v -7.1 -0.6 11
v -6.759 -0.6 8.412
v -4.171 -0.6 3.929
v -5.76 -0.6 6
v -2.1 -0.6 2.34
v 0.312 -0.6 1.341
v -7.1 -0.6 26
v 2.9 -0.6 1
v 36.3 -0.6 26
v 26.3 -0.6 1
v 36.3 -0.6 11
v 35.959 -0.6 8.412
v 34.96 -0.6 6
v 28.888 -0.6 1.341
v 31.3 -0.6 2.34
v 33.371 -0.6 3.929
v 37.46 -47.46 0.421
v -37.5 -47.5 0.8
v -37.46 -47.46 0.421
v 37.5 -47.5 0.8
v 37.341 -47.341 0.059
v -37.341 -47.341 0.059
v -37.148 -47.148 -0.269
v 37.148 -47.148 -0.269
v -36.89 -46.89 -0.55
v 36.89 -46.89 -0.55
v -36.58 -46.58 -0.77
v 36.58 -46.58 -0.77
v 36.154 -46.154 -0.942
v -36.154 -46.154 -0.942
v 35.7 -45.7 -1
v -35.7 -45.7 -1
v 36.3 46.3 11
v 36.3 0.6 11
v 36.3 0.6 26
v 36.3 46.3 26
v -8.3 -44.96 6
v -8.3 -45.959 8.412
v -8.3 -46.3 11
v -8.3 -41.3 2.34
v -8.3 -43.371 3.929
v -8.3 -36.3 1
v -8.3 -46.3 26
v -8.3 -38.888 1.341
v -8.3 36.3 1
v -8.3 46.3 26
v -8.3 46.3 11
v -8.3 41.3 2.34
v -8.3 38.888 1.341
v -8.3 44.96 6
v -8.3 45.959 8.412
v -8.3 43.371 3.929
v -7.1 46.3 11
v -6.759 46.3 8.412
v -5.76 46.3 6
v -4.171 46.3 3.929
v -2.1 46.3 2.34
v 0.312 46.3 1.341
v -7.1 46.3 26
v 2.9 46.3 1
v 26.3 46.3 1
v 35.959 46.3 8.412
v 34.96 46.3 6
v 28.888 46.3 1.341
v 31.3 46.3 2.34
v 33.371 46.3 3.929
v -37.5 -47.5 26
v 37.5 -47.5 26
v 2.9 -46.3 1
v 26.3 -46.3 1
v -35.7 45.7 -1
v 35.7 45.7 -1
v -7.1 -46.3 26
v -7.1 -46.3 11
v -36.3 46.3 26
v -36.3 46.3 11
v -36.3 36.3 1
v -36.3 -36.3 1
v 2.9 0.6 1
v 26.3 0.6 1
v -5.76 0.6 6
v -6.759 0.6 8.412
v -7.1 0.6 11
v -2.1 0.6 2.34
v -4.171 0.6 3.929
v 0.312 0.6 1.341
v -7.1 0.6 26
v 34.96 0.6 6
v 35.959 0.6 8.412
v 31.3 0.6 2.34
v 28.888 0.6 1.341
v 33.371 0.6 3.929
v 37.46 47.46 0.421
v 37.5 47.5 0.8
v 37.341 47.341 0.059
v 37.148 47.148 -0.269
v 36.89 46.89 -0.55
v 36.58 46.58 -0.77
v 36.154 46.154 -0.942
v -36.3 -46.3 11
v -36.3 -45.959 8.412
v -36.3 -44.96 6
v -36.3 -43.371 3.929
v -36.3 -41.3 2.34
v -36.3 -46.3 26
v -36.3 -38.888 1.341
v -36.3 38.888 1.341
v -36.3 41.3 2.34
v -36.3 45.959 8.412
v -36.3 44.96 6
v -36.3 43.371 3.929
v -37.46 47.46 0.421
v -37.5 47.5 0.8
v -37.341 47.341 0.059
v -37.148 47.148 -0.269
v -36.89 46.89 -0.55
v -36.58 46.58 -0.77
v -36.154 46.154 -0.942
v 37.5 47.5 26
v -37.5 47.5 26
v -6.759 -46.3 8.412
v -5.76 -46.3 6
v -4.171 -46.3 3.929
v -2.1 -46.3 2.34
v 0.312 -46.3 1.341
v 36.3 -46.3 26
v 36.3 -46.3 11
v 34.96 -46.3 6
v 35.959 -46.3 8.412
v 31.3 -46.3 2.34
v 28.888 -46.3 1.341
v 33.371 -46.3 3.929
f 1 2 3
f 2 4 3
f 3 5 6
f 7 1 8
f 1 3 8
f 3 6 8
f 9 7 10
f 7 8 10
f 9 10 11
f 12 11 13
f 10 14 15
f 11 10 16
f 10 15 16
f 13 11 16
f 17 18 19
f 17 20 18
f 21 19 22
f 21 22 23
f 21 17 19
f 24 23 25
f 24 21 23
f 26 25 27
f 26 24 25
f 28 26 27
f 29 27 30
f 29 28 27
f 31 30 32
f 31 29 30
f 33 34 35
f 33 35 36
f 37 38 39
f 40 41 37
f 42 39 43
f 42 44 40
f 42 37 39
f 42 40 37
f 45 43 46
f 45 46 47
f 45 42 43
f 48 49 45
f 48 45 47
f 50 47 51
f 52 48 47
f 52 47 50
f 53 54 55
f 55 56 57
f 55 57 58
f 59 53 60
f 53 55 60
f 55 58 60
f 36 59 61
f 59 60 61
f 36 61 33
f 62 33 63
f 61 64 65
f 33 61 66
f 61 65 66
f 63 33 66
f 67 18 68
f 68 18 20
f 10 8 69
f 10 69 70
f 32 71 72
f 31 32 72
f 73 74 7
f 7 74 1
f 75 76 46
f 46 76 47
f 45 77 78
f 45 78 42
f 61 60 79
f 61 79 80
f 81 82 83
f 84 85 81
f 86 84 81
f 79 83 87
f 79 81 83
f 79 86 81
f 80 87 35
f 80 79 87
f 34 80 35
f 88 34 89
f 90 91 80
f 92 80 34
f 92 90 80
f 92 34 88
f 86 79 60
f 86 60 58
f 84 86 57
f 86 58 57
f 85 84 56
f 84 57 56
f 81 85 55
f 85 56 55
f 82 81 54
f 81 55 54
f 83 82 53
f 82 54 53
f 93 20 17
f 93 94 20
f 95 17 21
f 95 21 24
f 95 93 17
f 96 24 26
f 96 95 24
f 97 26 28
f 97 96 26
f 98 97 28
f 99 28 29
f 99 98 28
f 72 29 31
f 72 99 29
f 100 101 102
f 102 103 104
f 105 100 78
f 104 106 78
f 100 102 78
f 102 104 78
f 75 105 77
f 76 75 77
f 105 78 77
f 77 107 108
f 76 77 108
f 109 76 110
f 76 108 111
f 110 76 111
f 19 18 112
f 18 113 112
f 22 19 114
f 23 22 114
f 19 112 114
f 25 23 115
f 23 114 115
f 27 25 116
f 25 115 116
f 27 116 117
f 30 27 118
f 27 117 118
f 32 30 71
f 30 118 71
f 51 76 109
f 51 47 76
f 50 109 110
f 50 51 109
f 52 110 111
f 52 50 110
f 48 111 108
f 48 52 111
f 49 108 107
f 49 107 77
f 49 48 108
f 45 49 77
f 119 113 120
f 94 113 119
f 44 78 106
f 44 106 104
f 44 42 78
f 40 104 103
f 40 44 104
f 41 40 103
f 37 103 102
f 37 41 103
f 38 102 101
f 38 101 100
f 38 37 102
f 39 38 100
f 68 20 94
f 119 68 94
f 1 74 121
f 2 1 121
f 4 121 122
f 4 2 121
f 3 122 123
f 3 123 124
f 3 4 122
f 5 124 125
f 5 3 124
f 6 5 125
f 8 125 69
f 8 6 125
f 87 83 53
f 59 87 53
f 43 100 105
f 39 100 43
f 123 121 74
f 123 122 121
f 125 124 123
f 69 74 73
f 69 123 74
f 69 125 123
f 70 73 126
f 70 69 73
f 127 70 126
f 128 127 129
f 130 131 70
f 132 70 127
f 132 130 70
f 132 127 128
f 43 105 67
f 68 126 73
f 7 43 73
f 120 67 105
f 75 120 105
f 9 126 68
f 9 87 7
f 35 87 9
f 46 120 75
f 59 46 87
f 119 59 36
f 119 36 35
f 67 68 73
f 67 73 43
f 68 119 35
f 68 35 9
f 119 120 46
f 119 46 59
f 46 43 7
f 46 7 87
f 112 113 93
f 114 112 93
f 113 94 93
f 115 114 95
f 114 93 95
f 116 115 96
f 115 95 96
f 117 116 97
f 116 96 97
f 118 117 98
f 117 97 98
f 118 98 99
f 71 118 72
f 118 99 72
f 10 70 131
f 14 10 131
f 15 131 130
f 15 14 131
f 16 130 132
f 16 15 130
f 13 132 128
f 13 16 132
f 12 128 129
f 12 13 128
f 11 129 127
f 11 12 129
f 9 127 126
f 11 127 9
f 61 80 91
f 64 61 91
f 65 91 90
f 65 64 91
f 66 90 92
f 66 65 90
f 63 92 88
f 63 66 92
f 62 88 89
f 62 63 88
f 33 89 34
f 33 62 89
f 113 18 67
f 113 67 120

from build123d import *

# Parameters (mm, degrees)
SKETCH011_W             = 75
SKETCH011_H             = 95
PAD007_DEPTH            = 1
SKETCH012_W             = 75
SKETCH012_H             = 95
SKETCH012_W_2           = 28
SKETCH012_H_2           = 92.6
SKETCH012_W_3           = 43.4
SKETCH012_H_3           = 45.7
PAD008_DEPTH            = 25
FILLET010_R             = 10
FILLET011_R             = 1.8
BODY003_PLACEMENT_ANGLE = 90


with BuildPart() as part:
    # Sketch011 → Pad007 (new body, symmetric)
    with BuildSketch(Plane.XZ):
        Rectangle(SKETCH011_W, SKETCH011_H)
    extrude(amount=PAD007_DEPTH, both=True)

    # Sketch012 → Pad008 (join)
    with BuildSketch(Plane.XZ.offset(1)):
        Rectangle(SKETCH012_W, SKETCH012_H)
        with Locations((-22.3, 0)):
            Rectangle(SKETCH012_W_2, SKETCH012_H_2, mode=Mode.SUBTRACT)
        with Locations((14.6, 23.45)):
            Rectangle(SKETCH012_W_3, SKETCH012_H_3, mode=Mode.SUBTRACT)
        with Locations((14.6, -23.45)):
            Rectangle(SKETCH012_W_3, SKETCH012_H_3, mode=Mode.SUBTRACT)
    extrude(amount=PAD008_DEPTH)

    # Fillet010
    fillet010_edges = [part.edges().sort_by_distance(p)[0] for p in [
        (36.3, -1, 23.45),
        (36.3, -1, -23.45),
        (-22.3, -1, 46.3),
        (-7.1, -1, 23.45),
        (-7.1, -1, -23.45),
        (-22.3, -1, -46.3),
    ]]
    fillet(fillet010_edges, radius=FILLET010_R)

    # Fillet011
    fillet011_edges = [part.edges().sort_by_distance(p)[0] for p in [
        (0, 1, 47.5),
        (37.5, 1, 0),
        (0, 1, -47.5),
        (-37.5, 1, 0),
    ]]
    fillet(fillet011_edges, radius=FILLET011_R)


with BuildPart() as part_1:
    # Body003 placement: moved
    add(part.part.rotate(Axis((0, 0, 0), (-1, 0, 0)), BODY003_PLACEMENT_ANGLE))


solid = part_1.part
